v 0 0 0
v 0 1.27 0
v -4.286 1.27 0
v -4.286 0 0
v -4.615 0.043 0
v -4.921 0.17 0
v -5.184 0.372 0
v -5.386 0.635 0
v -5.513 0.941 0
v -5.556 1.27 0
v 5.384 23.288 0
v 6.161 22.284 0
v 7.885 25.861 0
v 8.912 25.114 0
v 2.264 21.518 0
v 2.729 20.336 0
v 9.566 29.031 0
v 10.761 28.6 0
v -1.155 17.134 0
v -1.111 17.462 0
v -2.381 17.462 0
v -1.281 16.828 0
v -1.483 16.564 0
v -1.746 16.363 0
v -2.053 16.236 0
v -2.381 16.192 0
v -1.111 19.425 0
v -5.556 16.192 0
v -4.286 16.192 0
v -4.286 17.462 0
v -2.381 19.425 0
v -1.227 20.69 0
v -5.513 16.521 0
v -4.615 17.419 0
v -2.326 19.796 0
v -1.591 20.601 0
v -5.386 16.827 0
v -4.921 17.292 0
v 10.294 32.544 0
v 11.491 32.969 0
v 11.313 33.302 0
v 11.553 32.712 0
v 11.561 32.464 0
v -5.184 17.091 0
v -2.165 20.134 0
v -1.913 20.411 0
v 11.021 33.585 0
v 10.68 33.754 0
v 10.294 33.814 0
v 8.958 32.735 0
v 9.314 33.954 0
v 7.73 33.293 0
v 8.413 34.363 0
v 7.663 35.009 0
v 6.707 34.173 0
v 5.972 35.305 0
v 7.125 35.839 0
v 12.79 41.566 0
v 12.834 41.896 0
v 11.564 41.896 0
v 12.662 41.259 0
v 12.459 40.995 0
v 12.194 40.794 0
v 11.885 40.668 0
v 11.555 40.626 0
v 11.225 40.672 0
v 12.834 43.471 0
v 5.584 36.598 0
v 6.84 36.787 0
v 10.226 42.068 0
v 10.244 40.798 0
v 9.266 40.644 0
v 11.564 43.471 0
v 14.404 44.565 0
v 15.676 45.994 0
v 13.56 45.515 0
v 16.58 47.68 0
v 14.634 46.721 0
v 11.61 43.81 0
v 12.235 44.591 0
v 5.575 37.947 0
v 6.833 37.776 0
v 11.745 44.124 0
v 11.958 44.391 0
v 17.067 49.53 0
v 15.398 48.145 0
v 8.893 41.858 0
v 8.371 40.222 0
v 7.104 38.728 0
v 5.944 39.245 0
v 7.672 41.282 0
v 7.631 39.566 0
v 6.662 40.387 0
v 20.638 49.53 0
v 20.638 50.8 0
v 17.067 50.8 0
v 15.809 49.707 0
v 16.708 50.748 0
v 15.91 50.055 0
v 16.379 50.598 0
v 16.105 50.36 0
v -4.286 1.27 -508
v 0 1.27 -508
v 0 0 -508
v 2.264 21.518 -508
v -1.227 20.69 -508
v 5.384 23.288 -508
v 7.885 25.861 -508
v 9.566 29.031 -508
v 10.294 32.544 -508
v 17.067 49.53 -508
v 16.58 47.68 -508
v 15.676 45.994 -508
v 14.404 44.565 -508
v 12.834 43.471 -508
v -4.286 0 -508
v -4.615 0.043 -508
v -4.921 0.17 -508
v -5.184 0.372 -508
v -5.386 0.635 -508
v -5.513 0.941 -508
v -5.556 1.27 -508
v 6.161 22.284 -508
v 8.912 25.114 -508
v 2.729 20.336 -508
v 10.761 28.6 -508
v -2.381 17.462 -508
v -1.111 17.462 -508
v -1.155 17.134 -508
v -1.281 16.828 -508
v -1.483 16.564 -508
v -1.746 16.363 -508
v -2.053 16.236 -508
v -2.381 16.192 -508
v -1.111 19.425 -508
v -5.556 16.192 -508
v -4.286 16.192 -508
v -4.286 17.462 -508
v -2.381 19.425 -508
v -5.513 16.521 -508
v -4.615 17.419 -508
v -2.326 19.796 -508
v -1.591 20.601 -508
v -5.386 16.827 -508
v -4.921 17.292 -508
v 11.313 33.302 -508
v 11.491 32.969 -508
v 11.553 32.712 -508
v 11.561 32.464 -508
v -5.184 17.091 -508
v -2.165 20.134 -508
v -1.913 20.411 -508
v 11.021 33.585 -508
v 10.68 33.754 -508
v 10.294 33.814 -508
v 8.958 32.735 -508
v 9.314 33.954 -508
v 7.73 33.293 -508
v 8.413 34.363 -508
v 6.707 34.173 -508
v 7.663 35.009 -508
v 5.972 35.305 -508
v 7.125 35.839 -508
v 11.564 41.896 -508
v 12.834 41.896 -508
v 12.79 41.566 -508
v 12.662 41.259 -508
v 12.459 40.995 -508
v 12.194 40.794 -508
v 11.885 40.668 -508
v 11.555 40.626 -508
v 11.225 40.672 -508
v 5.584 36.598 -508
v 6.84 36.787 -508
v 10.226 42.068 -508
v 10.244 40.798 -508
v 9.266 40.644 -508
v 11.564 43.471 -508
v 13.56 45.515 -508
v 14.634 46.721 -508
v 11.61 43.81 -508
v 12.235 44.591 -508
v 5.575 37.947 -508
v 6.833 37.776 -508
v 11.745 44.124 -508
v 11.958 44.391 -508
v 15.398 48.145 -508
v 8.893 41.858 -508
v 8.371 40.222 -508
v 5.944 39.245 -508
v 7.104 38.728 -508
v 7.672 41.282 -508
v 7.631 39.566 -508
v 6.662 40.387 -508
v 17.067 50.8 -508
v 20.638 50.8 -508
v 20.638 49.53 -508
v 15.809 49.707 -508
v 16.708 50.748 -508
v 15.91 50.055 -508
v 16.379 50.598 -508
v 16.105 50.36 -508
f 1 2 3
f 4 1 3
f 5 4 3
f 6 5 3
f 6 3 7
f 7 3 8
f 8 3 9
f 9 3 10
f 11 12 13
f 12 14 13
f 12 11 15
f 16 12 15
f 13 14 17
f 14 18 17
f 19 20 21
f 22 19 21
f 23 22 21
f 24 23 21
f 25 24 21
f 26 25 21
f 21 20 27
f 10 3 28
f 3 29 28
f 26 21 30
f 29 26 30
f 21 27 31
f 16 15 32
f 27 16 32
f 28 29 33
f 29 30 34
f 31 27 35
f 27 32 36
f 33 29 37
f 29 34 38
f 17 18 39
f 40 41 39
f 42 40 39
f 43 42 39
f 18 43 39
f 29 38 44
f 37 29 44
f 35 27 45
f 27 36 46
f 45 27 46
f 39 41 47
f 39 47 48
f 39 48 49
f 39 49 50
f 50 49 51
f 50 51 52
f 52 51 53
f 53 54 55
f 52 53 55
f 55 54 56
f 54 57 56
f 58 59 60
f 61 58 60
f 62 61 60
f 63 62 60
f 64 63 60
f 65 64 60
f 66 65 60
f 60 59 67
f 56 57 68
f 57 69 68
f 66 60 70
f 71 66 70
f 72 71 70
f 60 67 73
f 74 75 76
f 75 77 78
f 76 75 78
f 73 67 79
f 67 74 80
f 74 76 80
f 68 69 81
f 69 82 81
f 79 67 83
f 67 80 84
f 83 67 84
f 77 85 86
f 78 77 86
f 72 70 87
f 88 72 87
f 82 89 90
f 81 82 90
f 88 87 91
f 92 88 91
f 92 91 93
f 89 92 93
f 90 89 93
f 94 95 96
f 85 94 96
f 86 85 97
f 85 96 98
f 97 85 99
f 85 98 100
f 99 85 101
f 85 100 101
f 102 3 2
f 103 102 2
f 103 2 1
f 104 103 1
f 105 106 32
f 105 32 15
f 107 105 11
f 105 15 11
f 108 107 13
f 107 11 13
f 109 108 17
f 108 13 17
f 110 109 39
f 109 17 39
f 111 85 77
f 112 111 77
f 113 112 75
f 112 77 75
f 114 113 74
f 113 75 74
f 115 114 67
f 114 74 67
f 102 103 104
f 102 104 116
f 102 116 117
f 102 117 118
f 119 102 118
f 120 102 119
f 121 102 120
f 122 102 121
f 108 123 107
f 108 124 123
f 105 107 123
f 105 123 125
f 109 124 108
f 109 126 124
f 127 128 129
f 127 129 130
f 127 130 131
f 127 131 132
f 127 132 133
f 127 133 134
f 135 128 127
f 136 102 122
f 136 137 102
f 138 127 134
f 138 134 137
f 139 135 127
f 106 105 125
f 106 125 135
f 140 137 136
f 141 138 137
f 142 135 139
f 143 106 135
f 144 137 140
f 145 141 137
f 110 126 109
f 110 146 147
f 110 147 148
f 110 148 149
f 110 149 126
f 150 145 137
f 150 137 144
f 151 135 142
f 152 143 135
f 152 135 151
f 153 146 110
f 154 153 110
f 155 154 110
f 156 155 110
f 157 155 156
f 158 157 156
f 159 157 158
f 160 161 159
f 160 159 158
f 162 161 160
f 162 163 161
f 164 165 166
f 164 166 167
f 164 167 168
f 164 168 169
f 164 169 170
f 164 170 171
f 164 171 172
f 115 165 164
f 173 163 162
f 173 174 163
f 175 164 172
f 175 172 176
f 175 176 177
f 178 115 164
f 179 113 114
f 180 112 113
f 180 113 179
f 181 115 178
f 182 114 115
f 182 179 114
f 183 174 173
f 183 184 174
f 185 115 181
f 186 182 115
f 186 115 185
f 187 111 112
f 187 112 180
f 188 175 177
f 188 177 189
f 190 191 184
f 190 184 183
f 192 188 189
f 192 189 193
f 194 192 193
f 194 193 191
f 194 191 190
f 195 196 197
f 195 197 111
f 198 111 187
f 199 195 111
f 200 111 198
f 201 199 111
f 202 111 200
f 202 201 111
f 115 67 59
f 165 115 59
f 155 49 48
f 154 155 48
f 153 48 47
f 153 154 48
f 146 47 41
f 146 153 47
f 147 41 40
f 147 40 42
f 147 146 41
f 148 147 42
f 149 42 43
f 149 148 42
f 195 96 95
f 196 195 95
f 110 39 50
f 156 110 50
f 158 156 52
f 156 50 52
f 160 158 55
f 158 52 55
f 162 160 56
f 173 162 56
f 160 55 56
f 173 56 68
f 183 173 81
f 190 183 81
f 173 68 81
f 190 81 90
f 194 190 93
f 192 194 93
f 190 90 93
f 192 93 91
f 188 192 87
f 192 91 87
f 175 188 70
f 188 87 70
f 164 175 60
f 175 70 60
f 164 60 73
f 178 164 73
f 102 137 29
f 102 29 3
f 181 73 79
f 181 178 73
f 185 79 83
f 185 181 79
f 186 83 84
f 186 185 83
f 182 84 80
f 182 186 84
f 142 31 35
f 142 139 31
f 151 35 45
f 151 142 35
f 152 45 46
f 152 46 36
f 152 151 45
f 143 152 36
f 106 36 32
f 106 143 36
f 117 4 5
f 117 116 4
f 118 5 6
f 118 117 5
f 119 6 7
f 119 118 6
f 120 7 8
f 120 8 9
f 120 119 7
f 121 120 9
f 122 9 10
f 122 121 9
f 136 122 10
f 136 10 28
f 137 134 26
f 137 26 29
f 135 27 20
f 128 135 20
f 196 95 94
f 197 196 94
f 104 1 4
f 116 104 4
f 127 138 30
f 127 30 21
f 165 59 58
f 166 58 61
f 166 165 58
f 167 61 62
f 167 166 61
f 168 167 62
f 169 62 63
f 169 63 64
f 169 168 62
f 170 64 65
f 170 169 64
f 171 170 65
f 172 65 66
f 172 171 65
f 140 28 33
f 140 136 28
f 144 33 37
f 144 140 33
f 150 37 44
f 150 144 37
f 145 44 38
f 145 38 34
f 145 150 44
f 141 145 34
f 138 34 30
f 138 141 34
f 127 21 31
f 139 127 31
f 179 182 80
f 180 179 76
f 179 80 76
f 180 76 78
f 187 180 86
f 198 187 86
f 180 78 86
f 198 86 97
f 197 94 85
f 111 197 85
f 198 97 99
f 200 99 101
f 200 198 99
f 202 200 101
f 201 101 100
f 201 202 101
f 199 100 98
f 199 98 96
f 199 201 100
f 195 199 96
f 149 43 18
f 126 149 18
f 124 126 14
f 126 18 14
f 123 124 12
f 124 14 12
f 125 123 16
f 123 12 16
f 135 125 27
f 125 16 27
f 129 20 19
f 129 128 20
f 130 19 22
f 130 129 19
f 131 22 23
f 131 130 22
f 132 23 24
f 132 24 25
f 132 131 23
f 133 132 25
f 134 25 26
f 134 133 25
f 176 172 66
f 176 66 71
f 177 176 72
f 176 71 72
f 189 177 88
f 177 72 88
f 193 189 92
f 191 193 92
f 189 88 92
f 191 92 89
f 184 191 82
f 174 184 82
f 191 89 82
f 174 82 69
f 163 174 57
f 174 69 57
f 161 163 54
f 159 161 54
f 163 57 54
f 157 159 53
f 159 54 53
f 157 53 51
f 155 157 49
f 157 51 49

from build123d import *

# Parameters (mm, degrees)
EXTRUDE_THIN1_DEPTH = 508
FILLET1_R           = 1.27


with BuildPart() as part:
    # Sketch1 → Extrude-Thin1 (new body)
    with BuildSketch(Plane.XY):
        with BuildLine():
            Line((0, 0), (-5.55625, 0))
            Line((-5.55625, 0), (-5.55625, 17.4625))
            Line((-5.55625, 17.4625), (-2.38125, 17.4625))
            Line((-2.38125, 17.4625), (-2.38125, 20.6375))
            ThreePointArc((-2.38125, 20.6375), (6.3138456, 24.080863867), (10.293921042, 32.54375))
            ThreePointArc((10.293921042, 32.54375), (5.574731916, 37.947077782), (11.563921042, 41.896294254))
            Line((11.563921042, 41.896294254), (11.563921042, 44.277544254))
            ThreePointArc((11.563921042, 44.277544254), (14.734219617, 46.868057482), (15.875, 50.8))
            Line((15.875, 50.8), (20.6375, 50.8))
            Line((20.6375, 50.8), (20.6375, 49.53))
            Line((20.6375, 49.53), (17.066657415, 49.53))
            ThreePointArc((17.066657415, 49.53), (15.675566735, 45.99394981), (12.833921042, 43.471285746))
            Line((12.833921042, 43.471285746), (12.833921042, 39.703322433))
            ThreePointArc((12.833921042, 39.703322433), (6.885679815, 38.068777372), (11.570295001, 34.055338472))
            ThreePointArc((11.570295001, 34.055338472), (8.174933988, 24.187206037), (-1.11125, 19.425347039))
            Line((-1.11125, 19.425347039), (-1.11125, 16.1925))
            Line((-1.11125, 16.1925), (-4.28625, 16.1925))
            Line((-4.28625, 16.1925), (-4.28625, 1.27))
            Line((-4.28625, 1.27), (0, 1.27))
            Line((0, 1.27), (0, 0))
        make_face()
    extrude(amount=-EXTRUDE_THIN1_DEPTH)

    # Fillet1
    fillet1_edges = [part.edges().sort_by_distance(p)[0] for p in [
        (12.833921042, 39.703322433, -254),
        (11.570295001, 34.055338472, -254),
        (-1.11125, 16.1925, -254),
        (-5.55625, 0, -254),
        (-5.55625, 17.4625, -254),
        (-2.38125, 20.6375, -254),
        (11.563921042, 44.277544254, -254),
        (15.875, 50.8, -254),
    ]]
    fillet(fillet1_edges, radius=FILLET1_R)


solid = part.part
